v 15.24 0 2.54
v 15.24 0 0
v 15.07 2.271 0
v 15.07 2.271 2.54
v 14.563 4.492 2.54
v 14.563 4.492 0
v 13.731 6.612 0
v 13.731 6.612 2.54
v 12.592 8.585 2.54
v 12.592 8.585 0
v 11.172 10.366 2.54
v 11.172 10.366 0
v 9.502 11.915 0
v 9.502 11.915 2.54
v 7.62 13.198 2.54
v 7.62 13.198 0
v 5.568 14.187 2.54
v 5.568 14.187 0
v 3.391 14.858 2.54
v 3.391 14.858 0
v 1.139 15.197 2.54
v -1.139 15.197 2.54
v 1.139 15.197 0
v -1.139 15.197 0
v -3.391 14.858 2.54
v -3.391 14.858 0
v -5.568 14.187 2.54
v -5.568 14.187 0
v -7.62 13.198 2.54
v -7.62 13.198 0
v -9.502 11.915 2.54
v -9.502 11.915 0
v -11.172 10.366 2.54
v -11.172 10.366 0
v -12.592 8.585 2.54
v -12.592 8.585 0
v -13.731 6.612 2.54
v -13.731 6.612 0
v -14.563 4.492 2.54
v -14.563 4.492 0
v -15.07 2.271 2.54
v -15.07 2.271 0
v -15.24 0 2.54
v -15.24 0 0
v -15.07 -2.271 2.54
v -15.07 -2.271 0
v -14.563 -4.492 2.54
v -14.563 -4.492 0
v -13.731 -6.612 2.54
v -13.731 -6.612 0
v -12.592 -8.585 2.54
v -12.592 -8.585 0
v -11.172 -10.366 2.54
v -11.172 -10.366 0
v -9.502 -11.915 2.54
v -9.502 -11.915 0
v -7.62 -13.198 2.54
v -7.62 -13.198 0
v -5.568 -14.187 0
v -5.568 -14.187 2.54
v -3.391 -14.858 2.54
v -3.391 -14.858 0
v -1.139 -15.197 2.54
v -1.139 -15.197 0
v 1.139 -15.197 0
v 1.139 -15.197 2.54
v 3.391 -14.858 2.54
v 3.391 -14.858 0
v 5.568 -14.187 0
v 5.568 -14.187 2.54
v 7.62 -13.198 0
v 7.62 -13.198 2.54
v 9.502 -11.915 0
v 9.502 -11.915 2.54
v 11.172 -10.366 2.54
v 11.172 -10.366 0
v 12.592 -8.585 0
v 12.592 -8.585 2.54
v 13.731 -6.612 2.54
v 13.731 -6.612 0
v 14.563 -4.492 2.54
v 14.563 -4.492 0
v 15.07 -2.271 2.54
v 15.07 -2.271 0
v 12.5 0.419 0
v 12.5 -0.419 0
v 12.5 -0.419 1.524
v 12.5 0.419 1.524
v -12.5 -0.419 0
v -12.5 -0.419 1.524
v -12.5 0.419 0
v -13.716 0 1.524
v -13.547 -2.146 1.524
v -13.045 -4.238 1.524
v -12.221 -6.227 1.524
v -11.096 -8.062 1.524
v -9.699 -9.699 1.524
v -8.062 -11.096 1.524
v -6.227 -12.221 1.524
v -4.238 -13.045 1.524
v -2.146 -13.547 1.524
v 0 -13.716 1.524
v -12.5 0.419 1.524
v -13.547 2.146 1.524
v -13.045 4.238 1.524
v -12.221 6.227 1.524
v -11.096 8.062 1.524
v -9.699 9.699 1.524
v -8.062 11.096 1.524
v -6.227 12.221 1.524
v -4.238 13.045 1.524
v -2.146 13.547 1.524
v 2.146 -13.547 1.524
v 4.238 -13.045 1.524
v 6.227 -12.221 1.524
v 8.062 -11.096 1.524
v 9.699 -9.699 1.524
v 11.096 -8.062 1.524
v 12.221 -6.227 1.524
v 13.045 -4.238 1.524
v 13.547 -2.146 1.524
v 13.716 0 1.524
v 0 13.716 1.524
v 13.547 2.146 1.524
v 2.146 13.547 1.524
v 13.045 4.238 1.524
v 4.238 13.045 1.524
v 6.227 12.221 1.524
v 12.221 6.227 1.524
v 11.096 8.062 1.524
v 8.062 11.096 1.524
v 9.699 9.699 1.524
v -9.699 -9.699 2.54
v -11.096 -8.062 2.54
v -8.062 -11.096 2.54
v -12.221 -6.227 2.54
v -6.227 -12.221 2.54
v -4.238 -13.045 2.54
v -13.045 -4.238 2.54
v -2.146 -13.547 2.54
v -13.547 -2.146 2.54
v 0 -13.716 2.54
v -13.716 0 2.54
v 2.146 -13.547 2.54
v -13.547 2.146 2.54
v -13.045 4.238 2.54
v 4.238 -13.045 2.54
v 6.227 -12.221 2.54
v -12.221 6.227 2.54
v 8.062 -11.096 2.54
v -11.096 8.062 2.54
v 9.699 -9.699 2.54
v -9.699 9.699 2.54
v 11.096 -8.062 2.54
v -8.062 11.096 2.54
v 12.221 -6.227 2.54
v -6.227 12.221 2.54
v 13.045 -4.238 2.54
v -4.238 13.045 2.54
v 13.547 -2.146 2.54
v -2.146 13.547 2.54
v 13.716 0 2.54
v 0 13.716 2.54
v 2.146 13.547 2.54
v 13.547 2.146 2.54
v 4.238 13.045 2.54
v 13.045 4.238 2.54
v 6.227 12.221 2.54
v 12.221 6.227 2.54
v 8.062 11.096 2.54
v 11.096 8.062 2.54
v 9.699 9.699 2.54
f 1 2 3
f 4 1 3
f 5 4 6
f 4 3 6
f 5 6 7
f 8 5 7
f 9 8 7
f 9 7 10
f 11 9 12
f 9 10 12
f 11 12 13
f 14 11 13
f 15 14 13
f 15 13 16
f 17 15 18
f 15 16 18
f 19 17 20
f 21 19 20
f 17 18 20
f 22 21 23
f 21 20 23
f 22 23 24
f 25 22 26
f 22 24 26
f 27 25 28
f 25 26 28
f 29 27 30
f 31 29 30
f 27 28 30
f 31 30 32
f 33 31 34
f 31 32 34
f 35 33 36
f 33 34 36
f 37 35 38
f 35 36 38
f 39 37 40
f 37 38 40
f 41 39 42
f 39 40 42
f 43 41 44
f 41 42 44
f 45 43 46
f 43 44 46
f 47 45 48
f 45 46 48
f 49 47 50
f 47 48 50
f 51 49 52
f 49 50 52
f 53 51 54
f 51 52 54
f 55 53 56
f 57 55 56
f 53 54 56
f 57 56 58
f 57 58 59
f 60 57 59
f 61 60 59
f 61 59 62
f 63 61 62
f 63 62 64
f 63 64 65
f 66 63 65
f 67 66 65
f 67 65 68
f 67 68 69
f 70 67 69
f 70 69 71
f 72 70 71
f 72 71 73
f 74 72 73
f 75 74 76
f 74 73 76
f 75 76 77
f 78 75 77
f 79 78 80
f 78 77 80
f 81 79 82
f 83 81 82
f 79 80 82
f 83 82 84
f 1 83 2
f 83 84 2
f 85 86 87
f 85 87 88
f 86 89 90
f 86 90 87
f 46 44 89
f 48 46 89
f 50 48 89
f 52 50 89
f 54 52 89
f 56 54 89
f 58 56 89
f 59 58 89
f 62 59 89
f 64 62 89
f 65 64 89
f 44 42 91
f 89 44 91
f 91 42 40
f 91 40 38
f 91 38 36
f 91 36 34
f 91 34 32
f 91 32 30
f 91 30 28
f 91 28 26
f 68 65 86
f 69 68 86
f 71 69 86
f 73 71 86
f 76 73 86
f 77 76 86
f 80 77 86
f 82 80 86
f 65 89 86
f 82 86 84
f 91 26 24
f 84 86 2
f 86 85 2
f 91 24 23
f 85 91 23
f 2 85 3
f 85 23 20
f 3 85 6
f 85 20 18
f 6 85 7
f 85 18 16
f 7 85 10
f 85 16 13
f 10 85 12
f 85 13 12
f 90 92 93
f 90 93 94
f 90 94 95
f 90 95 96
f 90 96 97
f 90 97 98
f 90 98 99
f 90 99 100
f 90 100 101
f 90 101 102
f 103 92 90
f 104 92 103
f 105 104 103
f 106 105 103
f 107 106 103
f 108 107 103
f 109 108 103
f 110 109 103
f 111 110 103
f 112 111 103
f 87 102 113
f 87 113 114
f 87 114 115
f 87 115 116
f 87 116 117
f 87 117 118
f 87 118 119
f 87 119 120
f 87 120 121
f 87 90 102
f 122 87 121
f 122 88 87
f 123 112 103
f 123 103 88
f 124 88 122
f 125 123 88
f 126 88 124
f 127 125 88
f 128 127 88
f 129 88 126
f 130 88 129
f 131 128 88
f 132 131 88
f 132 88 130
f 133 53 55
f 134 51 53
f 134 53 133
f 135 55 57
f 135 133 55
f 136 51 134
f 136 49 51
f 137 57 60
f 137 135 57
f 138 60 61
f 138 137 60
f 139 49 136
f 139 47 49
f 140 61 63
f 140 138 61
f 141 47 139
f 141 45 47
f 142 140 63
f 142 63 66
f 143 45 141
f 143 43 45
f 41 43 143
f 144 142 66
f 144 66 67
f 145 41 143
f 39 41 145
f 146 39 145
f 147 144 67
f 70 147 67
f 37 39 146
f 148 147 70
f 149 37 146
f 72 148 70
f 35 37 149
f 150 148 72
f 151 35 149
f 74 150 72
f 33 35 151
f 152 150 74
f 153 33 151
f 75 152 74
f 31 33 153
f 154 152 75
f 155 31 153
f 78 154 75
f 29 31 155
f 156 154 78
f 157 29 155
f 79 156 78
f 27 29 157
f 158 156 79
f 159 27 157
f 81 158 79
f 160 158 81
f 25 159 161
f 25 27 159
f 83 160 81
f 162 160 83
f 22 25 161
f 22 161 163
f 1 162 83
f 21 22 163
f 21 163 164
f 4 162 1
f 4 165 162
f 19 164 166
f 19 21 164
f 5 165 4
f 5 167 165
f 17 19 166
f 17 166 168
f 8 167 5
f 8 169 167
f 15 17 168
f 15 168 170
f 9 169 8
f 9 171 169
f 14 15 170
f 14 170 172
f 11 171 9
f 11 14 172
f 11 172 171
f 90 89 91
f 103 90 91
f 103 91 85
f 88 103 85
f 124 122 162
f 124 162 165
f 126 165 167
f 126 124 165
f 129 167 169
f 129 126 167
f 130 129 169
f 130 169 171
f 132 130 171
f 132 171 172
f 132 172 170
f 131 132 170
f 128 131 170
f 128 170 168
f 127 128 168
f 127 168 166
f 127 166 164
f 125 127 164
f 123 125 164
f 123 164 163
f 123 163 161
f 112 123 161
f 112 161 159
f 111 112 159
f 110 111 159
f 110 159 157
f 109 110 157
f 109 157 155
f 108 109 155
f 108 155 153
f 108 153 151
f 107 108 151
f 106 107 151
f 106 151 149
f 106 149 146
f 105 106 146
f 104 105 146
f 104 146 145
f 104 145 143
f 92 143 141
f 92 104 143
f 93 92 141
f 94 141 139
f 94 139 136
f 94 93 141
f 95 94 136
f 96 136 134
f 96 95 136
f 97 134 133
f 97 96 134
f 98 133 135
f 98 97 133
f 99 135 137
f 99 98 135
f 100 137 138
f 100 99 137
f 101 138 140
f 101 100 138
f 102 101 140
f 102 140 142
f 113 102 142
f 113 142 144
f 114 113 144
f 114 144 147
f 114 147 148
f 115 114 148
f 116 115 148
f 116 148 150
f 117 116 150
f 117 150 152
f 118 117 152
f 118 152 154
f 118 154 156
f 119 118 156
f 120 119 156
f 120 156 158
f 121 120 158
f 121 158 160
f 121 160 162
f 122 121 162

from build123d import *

# Parameters (mm, degrees)
F0_R     = 15.24
F0_R_2   = 13.716
F1_DEPTH = 2.54
F0_W     = 25
F0_H     = 0.8382
F2_DEPTH = 1.524


with BuildPart() as f1:
    # F0 (on Top) → F1 (new body)
    with BuildSketch(Plane.XY):
        Circle(F0_R)
        Circle(F0_R_2, mode=Mode.SUBTRACT)
    extrude(amount=F1_DEPTH)

    # F0 (on Top) → F2 (join)
    with BuildSketch(Plane.XY):
        Circle(F0_R_2)
        Rectangle(F0_W, F0_H, mode=Mode.SUBTRACT)
    extrude(amount=F2_DEPTH)


solid = f1.part
